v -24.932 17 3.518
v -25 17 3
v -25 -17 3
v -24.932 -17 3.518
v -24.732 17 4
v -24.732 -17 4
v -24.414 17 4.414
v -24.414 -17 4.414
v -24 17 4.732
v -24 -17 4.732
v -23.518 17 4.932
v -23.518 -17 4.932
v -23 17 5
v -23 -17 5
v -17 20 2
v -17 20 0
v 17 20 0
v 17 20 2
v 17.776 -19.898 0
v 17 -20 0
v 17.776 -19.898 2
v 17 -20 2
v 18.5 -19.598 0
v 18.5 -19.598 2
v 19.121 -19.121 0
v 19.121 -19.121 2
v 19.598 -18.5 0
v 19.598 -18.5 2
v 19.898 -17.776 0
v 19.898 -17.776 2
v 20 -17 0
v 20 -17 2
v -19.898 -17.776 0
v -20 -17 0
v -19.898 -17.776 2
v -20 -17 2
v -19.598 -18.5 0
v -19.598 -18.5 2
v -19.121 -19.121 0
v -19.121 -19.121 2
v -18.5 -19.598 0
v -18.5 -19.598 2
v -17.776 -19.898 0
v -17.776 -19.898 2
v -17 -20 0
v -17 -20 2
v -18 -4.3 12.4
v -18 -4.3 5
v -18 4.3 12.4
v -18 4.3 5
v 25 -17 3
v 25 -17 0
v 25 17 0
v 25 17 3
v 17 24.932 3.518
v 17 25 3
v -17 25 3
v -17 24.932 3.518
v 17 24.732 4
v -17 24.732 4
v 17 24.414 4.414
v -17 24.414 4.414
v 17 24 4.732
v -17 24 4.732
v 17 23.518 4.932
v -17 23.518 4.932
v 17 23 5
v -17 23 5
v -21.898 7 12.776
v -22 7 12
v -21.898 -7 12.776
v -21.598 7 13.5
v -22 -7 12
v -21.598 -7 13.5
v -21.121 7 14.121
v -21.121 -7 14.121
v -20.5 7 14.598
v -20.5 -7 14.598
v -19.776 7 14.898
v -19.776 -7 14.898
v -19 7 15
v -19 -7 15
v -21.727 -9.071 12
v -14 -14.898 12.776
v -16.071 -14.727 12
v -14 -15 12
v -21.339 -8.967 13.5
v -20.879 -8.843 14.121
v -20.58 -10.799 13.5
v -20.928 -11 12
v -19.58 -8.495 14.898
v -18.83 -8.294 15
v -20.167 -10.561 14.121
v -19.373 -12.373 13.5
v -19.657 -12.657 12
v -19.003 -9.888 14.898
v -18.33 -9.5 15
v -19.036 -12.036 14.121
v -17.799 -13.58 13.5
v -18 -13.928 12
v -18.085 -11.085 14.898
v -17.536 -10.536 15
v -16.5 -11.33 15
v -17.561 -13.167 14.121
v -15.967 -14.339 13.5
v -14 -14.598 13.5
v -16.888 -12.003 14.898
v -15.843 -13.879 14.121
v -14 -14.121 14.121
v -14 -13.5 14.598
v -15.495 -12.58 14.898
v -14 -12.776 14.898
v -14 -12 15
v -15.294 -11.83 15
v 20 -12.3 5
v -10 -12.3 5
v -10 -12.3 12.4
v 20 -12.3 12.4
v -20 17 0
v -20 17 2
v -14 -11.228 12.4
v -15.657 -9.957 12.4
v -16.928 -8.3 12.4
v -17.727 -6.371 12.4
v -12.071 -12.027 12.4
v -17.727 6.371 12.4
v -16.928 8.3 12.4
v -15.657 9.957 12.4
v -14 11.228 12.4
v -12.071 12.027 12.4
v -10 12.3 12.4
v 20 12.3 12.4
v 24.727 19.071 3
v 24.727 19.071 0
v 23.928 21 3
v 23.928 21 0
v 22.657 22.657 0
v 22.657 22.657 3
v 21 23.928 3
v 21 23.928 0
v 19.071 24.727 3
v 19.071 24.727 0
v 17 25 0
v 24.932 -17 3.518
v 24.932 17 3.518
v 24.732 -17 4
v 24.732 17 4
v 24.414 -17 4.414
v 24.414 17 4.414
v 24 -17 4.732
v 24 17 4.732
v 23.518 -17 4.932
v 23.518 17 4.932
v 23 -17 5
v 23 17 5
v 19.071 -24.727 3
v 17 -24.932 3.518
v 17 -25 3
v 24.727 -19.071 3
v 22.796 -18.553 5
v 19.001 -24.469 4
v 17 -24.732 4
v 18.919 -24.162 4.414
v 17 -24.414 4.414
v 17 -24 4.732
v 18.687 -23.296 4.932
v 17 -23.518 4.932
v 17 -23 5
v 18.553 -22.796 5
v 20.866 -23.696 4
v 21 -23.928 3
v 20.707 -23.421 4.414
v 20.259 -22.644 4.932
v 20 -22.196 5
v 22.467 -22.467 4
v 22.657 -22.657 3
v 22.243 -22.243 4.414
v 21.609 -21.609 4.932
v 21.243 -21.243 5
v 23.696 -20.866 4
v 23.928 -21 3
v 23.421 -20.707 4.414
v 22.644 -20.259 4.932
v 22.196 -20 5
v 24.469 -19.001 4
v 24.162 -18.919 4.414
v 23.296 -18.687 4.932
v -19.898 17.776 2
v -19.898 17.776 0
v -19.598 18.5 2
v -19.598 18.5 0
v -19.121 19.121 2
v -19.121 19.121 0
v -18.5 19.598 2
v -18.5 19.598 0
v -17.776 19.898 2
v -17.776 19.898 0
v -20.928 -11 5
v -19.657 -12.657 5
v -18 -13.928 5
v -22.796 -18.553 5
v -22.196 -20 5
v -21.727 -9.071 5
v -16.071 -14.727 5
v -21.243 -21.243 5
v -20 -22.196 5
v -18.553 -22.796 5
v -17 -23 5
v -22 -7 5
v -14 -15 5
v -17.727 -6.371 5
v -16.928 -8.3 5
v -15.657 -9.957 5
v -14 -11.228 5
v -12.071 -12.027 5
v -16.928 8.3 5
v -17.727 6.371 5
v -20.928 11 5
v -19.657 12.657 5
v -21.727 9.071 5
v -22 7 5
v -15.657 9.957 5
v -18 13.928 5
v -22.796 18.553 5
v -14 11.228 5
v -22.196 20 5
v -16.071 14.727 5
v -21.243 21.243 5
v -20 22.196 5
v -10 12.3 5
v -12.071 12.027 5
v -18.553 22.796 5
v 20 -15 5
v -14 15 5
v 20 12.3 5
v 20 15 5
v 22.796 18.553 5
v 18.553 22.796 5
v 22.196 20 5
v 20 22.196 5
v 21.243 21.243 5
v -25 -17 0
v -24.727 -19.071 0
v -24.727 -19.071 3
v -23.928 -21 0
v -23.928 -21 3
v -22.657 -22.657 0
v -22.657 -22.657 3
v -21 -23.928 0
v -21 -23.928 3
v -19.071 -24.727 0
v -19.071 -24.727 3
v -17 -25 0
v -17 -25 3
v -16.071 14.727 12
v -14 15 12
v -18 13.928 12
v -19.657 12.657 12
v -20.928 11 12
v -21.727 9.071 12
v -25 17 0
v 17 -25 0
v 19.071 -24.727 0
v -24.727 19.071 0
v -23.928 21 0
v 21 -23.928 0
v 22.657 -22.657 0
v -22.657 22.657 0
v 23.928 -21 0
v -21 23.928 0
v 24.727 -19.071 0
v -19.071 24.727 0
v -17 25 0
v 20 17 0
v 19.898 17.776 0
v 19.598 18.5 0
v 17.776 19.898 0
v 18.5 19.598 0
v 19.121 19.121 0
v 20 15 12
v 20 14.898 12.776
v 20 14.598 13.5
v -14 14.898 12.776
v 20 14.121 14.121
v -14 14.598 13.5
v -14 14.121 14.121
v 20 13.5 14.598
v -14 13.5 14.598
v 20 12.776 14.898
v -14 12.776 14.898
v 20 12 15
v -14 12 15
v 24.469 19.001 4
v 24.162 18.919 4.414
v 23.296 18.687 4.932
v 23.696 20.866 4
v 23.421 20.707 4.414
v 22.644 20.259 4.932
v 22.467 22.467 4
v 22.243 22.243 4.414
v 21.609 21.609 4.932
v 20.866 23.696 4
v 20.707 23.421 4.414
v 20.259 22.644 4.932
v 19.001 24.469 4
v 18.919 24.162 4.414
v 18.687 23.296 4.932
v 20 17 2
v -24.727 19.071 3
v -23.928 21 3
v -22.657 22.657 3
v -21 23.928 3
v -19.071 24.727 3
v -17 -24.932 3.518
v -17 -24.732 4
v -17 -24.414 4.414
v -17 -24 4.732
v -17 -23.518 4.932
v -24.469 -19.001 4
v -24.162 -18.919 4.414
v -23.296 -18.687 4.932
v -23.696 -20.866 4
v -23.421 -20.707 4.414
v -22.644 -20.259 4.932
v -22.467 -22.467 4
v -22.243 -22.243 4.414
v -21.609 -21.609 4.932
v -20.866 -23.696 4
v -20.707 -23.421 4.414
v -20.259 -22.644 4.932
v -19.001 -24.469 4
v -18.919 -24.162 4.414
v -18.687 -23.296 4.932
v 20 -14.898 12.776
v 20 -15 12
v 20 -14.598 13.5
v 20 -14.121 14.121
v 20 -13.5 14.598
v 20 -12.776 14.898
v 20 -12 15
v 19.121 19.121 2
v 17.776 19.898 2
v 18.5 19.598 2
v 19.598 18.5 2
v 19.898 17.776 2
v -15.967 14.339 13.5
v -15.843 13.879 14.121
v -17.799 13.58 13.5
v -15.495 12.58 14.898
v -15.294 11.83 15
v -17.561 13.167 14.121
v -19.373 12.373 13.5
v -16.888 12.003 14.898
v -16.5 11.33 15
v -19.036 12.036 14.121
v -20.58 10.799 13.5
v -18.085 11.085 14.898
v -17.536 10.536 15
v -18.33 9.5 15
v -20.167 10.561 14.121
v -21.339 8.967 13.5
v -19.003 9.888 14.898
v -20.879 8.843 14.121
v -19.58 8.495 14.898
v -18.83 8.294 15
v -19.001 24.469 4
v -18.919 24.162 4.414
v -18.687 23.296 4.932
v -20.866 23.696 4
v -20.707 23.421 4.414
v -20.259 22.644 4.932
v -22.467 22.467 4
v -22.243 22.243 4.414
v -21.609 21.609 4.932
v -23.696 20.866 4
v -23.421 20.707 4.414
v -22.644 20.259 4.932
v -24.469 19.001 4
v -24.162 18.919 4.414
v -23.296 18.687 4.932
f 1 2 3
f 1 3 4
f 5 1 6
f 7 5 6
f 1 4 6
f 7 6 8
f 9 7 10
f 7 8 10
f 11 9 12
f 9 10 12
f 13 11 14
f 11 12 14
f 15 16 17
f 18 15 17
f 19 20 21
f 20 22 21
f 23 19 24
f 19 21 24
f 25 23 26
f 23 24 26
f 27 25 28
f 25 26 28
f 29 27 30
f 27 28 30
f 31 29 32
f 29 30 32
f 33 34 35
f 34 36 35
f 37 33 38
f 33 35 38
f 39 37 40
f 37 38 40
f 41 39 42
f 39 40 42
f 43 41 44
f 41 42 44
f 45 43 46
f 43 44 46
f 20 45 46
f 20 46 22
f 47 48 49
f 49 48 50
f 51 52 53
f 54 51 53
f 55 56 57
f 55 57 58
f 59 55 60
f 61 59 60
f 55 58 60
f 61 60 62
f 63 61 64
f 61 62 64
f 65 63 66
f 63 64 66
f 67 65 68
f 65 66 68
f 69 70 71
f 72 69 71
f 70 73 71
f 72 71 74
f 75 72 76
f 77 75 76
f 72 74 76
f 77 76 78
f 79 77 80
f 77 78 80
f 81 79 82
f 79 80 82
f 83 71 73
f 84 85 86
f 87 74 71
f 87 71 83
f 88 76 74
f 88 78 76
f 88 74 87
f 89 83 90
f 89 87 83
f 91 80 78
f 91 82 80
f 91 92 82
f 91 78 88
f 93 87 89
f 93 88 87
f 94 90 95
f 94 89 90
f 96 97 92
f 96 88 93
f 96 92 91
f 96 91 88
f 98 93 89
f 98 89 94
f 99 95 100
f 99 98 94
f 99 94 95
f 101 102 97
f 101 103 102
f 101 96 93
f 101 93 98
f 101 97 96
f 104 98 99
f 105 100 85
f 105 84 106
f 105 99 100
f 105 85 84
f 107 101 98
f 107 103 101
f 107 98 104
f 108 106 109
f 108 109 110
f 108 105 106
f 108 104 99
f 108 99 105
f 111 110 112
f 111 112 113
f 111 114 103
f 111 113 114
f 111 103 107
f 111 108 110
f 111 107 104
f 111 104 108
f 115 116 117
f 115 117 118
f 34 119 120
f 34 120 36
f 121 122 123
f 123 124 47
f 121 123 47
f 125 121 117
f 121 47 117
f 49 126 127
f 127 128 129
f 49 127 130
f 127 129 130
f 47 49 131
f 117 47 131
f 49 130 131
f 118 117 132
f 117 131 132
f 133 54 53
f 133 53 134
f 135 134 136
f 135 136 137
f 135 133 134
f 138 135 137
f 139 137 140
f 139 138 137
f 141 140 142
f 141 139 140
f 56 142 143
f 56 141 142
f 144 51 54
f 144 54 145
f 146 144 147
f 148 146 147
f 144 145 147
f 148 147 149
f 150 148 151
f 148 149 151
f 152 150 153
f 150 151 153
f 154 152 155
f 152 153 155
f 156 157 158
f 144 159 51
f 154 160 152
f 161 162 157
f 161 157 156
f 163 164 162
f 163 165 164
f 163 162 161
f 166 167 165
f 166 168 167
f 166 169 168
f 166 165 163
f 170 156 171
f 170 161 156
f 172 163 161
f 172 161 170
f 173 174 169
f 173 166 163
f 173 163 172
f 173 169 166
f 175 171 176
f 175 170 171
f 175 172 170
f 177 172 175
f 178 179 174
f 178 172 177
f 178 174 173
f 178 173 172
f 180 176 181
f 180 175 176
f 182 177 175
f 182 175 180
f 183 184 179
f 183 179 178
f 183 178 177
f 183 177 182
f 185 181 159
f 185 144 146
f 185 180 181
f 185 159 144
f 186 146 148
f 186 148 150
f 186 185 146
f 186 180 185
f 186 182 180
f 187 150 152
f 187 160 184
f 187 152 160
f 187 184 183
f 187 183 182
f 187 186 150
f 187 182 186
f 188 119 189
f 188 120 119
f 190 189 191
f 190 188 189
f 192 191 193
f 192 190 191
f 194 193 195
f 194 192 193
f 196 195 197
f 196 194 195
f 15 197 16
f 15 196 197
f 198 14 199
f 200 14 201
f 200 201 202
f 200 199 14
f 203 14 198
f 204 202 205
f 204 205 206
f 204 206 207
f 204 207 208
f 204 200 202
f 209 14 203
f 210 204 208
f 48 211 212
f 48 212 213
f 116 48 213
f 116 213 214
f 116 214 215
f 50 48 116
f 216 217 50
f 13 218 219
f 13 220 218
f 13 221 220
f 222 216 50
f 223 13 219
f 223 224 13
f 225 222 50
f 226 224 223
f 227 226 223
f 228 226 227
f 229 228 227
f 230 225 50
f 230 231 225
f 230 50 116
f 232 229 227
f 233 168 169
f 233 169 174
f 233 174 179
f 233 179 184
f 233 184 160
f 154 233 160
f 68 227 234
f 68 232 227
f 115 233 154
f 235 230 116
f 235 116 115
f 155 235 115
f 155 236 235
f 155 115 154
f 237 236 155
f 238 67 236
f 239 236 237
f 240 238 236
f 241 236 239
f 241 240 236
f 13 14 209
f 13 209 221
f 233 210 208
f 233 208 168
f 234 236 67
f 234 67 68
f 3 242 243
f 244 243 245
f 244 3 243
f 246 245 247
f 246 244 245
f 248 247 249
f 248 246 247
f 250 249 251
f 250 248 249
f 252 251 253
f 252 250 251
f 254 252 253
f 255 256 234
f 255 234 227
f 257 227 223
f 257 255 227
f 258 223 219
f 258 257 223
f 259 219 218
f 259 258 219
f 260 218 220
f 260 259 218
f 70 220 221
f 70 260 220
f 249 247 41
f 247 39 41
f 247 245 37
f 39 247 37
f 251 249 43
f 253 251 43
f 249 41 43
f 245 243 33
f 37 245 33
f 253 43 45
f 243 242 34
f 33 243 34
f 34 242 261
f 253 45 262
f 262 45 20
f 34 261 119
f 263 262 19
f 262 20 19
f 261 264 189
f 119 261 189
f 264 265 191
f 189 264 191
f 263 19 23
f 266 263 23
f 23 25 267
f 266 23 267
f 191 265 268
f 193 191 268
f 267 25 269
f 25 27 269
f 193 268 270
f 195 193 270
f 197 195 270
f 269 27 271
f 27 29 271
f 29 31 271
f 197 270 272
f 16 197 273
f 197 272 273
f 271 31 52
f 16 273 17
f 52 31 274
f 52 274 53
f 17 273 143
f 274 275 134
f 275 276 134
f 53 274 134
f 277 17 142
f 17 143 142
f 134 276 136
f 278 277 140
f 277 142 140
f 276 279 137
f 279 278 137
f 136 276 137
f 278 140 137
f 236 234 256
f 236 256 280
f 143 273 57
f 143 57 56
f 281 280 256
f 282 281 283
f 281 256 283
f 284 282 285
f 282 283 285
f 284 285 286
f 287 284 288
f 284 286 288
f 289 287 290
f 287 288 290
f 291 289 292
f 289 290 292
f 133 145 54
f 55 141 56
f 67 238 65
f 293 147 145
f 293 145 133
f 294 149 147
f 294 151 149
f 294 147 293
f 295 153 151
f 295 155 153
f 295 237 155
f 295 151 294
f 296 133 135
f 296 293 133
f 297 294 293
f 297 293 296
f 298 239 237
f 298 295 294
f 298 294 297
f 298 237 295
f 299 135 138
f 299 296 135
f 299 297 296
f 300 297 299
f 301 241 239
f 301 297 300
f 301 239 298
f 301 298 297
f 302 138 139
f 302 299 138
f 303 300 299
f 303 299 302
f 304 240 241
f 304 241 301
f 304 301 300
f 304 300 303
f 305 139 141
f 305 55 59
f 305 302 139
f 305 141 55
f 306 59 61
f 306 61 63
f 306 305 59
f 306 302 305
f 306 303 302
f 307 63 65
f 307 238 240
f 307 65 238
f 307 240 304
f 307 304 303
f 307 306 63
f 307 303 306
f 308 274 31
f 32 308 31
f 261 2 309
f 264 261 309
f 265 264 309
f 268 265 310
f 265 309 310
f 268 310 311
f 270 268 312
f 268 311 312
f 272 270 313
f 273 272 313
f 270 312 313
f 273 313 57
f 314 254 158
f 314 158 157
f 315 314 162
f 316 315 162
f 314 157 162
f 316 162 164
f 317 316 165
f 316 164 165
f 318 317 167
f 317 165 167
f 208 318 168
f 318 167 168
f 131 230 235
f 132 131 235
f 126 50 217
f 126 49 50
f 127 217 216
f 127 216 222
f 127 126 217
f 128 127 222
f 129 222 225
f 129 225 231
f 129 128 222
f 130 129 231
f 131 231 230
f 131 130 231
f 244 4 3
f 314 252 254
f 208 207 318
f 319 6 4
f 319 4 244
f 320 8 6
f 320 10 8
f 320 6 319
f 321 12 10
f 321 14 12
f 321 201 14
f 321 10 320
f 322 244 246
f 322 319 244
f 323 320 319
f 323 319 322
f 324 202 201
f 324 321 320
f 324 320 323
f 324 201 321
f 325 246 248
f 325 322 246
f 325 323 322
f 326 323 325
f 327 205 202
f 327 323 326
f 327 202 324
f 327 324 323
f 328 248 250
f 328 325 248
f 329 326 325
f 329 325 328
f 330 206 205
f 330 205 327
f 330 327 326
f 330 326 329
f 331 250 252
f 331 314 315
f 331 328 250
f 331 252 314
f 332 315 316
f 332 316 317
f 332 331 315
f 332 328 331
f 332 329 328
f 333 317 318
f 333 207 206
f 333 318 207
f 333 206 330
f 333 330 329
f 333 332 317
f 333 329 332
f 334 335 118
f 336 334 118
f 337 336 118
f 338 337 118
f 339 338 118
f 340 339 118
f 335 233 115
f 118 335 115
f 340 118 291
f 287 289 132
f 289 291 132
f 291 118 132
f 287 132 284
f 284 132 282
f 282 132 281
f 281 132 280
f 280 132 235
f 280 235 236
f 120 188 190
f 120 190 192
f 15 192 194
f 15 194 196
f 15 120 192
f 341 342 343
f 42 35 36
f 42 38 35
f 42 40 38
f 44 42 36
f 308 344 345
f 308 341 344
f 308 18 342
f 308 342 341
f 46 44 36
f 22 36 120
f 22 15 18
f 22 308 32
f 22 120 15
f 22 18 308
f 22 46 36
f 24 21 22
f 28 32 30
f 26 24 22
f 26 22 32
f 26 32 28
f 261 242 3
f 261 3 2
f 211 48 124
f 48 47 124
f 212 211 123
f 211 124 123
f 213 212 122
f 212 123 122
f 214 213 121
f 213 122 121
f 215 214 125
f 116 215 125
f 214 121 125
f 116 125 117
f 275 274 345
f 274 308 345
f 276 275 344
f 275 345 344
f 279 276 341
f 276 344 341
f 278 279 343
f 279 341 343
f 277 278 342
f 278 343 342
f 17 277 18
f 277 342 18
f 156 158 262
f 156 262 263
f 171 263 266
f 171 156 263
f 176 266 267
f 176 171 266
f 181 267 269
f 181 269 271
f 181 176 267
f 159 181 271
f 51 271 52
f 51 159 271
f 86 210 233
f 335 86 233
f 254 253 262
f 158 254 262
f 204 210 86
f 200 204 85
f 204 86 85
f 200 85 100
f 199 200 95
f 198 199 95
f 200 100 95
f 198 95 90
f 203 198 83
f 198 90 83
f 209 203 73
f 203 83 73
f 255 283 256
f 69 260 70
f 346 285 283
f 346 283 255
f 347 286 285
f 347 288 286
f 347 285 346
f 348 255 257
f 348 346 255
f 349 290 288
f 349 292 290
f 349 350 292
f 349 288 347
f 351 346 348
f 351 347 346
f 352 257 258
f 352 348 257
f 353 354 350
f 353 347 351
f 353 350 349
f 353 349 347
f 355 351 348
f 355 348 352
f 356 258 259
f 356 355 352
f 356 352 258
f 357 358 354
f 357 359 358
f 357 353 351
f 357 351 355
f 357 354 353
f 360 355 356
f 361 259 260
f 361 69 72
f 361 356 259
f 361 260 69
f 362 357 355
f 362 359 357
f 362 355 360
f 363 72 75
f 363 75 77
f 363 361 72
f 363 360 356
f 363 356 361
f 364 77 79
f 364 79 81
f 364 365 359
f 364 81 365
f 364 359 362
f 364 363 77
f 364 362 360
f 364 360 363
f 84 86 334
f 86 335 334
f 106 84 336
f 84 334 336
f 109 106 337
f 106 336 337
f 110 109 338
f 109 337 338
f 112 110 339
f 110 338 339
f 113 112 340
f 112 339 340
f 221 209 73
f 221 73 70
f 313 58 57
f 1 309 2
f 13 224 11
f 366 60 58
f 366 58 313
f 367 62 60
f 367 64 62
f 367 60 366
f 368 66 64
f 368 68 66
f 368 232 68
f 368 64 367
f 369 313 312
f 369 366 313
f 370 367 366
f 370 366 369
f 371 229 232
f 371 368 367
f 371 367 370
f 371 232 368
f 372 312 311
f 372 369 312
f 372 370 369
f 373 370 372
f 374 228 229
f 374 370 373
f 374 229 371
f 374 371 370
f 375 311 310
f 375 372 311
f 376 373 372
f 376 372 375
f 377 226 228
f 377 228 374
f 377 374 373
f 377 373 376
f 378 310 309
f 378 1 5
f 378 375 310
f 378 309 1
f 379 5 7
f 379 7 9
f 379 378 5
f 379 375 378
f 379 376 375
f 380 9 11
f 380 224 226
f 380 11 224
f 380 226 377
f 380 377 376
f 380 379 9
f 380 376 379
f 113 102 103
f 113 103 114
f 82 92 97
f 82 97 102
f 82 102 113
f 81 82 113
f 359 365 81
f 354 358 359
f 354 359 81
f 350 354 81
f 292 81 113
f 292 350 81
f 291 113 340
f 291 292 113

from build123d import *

# Parameters (mm, degrees)
SKETCH002_W  = 42
SKETCH002_H  = 24.6
PAD002_DEPTH = 7.4
FILLET004_R  = 8
SKETCH_W     = 50
SKETCH_H     = 50
PAD_DEPTH    = 5
FILLET_R     = 8
SKETCH001_W  = 42
SKETCH001_H  = 30
PAD001_DEPTH = 10
SKETCH003_W  = 40
SKETCH003_H  = 40
POCKET_DEPTH = 2
FILLET005_R  = 8
FILLET006_R  = 3
FILLET007_R  = 2
FILLET008_R  = 3


with BuildPart() as body001:
    # Sketch002 → Pad002 (new body)
    with BuildSketch(Plane.XY):
        with Locations((3, 0)):
            Rectangle(SKETCH002_W, SKETCH002_H)
    extrude(amount=PAD002_DEPTH)

    # Fillet004
    fillet004_edges = [body001.edges().sort_by_distance(p)[0] for p in [
        (-18, 12.3, 3.7),
        (-18, -12.3, 3.7),
    ]]
    fillet(fillet004_edges, radius=FILLET004_R)


with BuildPart() as body001_1:
    # Body001 placement: moved
    add(body001.part.moved(Location((0, 0, 5))))


with BuildPart() as body:
    # Sketch → Pad (new body)
    with BuildSketch(Plane.XY):
        Rectangle(SKETCH_W, SKETCH_H)
    extrude(amount=PAD_DEPTH)

    # Fillet
    fillet_edges = [body.edges().sort_by_distance(p)[0] for p in [
        (25, 25, 2.5),
        (25, -25, 2.5),
        (-25, 25, 2.5),
        (-25, -25, 2.5),
    ]]
    fillet(fillet_edges, radius=FILLET_R)

    # Sketch001 (on Face5 of Fillet) → Pad001 (join)
    with BuildSketch(Plane.XY.offset(5)):
        with Locations((-1, 0)):
            Rectangle(SKETCH001_W, SKETCH001_H)
    extrude(amount=PAD001_DEPTH)

    # Sketch003 → Pocket (cut)
    with BuildSketch(Plane(origin=(0, 0, 0), x_dir=(1, 0, 0), z_dir=(0, 0, -1))):
        Rectangle(SKETCH003_W, SKETCH003_H)
    extrude(amount=-POCKET_DEPTH, mode=Mode.SUBTRACT)

    # Boolean: cut Body001
    add(body001_1.part, mode=Mode.SUBTRACT)

    # Fillet005
    fillet005_edges = [body.edges().sort_by_distance(p)[0] for p in [
        (-22, 15, 10),
        (-22, -15, 10),
    ]]
    fillet(fillet005_edges, radius=FILLET005_R)

    # Fillet006
    fillet006_edges = [body.edges().sort_by_distance(p)[0] for p in [
        (-20, -20, 1),
        (-20, 20, 1),
        (20, 20, 1),
        (20, -20, 1),
    ]]
    fillet(fillet006_edges, radius=FILLET006_R)

    # Fillet007
    fillet007_edges = [body.edges().sort_by_distance(p)[0] for p in [
        (0, -25, 5),
    ]]
    fillet(fillet007_edges, radius=FILLET007_R)

    # Fillet008
    fillet008_edges = [body.edges().sort_by_distance(p)[0] for p in [
        (3, -15, 15),
    ]]
    fillet(fillet008_edges, radius=FILLET008_R)


solid = body.part
